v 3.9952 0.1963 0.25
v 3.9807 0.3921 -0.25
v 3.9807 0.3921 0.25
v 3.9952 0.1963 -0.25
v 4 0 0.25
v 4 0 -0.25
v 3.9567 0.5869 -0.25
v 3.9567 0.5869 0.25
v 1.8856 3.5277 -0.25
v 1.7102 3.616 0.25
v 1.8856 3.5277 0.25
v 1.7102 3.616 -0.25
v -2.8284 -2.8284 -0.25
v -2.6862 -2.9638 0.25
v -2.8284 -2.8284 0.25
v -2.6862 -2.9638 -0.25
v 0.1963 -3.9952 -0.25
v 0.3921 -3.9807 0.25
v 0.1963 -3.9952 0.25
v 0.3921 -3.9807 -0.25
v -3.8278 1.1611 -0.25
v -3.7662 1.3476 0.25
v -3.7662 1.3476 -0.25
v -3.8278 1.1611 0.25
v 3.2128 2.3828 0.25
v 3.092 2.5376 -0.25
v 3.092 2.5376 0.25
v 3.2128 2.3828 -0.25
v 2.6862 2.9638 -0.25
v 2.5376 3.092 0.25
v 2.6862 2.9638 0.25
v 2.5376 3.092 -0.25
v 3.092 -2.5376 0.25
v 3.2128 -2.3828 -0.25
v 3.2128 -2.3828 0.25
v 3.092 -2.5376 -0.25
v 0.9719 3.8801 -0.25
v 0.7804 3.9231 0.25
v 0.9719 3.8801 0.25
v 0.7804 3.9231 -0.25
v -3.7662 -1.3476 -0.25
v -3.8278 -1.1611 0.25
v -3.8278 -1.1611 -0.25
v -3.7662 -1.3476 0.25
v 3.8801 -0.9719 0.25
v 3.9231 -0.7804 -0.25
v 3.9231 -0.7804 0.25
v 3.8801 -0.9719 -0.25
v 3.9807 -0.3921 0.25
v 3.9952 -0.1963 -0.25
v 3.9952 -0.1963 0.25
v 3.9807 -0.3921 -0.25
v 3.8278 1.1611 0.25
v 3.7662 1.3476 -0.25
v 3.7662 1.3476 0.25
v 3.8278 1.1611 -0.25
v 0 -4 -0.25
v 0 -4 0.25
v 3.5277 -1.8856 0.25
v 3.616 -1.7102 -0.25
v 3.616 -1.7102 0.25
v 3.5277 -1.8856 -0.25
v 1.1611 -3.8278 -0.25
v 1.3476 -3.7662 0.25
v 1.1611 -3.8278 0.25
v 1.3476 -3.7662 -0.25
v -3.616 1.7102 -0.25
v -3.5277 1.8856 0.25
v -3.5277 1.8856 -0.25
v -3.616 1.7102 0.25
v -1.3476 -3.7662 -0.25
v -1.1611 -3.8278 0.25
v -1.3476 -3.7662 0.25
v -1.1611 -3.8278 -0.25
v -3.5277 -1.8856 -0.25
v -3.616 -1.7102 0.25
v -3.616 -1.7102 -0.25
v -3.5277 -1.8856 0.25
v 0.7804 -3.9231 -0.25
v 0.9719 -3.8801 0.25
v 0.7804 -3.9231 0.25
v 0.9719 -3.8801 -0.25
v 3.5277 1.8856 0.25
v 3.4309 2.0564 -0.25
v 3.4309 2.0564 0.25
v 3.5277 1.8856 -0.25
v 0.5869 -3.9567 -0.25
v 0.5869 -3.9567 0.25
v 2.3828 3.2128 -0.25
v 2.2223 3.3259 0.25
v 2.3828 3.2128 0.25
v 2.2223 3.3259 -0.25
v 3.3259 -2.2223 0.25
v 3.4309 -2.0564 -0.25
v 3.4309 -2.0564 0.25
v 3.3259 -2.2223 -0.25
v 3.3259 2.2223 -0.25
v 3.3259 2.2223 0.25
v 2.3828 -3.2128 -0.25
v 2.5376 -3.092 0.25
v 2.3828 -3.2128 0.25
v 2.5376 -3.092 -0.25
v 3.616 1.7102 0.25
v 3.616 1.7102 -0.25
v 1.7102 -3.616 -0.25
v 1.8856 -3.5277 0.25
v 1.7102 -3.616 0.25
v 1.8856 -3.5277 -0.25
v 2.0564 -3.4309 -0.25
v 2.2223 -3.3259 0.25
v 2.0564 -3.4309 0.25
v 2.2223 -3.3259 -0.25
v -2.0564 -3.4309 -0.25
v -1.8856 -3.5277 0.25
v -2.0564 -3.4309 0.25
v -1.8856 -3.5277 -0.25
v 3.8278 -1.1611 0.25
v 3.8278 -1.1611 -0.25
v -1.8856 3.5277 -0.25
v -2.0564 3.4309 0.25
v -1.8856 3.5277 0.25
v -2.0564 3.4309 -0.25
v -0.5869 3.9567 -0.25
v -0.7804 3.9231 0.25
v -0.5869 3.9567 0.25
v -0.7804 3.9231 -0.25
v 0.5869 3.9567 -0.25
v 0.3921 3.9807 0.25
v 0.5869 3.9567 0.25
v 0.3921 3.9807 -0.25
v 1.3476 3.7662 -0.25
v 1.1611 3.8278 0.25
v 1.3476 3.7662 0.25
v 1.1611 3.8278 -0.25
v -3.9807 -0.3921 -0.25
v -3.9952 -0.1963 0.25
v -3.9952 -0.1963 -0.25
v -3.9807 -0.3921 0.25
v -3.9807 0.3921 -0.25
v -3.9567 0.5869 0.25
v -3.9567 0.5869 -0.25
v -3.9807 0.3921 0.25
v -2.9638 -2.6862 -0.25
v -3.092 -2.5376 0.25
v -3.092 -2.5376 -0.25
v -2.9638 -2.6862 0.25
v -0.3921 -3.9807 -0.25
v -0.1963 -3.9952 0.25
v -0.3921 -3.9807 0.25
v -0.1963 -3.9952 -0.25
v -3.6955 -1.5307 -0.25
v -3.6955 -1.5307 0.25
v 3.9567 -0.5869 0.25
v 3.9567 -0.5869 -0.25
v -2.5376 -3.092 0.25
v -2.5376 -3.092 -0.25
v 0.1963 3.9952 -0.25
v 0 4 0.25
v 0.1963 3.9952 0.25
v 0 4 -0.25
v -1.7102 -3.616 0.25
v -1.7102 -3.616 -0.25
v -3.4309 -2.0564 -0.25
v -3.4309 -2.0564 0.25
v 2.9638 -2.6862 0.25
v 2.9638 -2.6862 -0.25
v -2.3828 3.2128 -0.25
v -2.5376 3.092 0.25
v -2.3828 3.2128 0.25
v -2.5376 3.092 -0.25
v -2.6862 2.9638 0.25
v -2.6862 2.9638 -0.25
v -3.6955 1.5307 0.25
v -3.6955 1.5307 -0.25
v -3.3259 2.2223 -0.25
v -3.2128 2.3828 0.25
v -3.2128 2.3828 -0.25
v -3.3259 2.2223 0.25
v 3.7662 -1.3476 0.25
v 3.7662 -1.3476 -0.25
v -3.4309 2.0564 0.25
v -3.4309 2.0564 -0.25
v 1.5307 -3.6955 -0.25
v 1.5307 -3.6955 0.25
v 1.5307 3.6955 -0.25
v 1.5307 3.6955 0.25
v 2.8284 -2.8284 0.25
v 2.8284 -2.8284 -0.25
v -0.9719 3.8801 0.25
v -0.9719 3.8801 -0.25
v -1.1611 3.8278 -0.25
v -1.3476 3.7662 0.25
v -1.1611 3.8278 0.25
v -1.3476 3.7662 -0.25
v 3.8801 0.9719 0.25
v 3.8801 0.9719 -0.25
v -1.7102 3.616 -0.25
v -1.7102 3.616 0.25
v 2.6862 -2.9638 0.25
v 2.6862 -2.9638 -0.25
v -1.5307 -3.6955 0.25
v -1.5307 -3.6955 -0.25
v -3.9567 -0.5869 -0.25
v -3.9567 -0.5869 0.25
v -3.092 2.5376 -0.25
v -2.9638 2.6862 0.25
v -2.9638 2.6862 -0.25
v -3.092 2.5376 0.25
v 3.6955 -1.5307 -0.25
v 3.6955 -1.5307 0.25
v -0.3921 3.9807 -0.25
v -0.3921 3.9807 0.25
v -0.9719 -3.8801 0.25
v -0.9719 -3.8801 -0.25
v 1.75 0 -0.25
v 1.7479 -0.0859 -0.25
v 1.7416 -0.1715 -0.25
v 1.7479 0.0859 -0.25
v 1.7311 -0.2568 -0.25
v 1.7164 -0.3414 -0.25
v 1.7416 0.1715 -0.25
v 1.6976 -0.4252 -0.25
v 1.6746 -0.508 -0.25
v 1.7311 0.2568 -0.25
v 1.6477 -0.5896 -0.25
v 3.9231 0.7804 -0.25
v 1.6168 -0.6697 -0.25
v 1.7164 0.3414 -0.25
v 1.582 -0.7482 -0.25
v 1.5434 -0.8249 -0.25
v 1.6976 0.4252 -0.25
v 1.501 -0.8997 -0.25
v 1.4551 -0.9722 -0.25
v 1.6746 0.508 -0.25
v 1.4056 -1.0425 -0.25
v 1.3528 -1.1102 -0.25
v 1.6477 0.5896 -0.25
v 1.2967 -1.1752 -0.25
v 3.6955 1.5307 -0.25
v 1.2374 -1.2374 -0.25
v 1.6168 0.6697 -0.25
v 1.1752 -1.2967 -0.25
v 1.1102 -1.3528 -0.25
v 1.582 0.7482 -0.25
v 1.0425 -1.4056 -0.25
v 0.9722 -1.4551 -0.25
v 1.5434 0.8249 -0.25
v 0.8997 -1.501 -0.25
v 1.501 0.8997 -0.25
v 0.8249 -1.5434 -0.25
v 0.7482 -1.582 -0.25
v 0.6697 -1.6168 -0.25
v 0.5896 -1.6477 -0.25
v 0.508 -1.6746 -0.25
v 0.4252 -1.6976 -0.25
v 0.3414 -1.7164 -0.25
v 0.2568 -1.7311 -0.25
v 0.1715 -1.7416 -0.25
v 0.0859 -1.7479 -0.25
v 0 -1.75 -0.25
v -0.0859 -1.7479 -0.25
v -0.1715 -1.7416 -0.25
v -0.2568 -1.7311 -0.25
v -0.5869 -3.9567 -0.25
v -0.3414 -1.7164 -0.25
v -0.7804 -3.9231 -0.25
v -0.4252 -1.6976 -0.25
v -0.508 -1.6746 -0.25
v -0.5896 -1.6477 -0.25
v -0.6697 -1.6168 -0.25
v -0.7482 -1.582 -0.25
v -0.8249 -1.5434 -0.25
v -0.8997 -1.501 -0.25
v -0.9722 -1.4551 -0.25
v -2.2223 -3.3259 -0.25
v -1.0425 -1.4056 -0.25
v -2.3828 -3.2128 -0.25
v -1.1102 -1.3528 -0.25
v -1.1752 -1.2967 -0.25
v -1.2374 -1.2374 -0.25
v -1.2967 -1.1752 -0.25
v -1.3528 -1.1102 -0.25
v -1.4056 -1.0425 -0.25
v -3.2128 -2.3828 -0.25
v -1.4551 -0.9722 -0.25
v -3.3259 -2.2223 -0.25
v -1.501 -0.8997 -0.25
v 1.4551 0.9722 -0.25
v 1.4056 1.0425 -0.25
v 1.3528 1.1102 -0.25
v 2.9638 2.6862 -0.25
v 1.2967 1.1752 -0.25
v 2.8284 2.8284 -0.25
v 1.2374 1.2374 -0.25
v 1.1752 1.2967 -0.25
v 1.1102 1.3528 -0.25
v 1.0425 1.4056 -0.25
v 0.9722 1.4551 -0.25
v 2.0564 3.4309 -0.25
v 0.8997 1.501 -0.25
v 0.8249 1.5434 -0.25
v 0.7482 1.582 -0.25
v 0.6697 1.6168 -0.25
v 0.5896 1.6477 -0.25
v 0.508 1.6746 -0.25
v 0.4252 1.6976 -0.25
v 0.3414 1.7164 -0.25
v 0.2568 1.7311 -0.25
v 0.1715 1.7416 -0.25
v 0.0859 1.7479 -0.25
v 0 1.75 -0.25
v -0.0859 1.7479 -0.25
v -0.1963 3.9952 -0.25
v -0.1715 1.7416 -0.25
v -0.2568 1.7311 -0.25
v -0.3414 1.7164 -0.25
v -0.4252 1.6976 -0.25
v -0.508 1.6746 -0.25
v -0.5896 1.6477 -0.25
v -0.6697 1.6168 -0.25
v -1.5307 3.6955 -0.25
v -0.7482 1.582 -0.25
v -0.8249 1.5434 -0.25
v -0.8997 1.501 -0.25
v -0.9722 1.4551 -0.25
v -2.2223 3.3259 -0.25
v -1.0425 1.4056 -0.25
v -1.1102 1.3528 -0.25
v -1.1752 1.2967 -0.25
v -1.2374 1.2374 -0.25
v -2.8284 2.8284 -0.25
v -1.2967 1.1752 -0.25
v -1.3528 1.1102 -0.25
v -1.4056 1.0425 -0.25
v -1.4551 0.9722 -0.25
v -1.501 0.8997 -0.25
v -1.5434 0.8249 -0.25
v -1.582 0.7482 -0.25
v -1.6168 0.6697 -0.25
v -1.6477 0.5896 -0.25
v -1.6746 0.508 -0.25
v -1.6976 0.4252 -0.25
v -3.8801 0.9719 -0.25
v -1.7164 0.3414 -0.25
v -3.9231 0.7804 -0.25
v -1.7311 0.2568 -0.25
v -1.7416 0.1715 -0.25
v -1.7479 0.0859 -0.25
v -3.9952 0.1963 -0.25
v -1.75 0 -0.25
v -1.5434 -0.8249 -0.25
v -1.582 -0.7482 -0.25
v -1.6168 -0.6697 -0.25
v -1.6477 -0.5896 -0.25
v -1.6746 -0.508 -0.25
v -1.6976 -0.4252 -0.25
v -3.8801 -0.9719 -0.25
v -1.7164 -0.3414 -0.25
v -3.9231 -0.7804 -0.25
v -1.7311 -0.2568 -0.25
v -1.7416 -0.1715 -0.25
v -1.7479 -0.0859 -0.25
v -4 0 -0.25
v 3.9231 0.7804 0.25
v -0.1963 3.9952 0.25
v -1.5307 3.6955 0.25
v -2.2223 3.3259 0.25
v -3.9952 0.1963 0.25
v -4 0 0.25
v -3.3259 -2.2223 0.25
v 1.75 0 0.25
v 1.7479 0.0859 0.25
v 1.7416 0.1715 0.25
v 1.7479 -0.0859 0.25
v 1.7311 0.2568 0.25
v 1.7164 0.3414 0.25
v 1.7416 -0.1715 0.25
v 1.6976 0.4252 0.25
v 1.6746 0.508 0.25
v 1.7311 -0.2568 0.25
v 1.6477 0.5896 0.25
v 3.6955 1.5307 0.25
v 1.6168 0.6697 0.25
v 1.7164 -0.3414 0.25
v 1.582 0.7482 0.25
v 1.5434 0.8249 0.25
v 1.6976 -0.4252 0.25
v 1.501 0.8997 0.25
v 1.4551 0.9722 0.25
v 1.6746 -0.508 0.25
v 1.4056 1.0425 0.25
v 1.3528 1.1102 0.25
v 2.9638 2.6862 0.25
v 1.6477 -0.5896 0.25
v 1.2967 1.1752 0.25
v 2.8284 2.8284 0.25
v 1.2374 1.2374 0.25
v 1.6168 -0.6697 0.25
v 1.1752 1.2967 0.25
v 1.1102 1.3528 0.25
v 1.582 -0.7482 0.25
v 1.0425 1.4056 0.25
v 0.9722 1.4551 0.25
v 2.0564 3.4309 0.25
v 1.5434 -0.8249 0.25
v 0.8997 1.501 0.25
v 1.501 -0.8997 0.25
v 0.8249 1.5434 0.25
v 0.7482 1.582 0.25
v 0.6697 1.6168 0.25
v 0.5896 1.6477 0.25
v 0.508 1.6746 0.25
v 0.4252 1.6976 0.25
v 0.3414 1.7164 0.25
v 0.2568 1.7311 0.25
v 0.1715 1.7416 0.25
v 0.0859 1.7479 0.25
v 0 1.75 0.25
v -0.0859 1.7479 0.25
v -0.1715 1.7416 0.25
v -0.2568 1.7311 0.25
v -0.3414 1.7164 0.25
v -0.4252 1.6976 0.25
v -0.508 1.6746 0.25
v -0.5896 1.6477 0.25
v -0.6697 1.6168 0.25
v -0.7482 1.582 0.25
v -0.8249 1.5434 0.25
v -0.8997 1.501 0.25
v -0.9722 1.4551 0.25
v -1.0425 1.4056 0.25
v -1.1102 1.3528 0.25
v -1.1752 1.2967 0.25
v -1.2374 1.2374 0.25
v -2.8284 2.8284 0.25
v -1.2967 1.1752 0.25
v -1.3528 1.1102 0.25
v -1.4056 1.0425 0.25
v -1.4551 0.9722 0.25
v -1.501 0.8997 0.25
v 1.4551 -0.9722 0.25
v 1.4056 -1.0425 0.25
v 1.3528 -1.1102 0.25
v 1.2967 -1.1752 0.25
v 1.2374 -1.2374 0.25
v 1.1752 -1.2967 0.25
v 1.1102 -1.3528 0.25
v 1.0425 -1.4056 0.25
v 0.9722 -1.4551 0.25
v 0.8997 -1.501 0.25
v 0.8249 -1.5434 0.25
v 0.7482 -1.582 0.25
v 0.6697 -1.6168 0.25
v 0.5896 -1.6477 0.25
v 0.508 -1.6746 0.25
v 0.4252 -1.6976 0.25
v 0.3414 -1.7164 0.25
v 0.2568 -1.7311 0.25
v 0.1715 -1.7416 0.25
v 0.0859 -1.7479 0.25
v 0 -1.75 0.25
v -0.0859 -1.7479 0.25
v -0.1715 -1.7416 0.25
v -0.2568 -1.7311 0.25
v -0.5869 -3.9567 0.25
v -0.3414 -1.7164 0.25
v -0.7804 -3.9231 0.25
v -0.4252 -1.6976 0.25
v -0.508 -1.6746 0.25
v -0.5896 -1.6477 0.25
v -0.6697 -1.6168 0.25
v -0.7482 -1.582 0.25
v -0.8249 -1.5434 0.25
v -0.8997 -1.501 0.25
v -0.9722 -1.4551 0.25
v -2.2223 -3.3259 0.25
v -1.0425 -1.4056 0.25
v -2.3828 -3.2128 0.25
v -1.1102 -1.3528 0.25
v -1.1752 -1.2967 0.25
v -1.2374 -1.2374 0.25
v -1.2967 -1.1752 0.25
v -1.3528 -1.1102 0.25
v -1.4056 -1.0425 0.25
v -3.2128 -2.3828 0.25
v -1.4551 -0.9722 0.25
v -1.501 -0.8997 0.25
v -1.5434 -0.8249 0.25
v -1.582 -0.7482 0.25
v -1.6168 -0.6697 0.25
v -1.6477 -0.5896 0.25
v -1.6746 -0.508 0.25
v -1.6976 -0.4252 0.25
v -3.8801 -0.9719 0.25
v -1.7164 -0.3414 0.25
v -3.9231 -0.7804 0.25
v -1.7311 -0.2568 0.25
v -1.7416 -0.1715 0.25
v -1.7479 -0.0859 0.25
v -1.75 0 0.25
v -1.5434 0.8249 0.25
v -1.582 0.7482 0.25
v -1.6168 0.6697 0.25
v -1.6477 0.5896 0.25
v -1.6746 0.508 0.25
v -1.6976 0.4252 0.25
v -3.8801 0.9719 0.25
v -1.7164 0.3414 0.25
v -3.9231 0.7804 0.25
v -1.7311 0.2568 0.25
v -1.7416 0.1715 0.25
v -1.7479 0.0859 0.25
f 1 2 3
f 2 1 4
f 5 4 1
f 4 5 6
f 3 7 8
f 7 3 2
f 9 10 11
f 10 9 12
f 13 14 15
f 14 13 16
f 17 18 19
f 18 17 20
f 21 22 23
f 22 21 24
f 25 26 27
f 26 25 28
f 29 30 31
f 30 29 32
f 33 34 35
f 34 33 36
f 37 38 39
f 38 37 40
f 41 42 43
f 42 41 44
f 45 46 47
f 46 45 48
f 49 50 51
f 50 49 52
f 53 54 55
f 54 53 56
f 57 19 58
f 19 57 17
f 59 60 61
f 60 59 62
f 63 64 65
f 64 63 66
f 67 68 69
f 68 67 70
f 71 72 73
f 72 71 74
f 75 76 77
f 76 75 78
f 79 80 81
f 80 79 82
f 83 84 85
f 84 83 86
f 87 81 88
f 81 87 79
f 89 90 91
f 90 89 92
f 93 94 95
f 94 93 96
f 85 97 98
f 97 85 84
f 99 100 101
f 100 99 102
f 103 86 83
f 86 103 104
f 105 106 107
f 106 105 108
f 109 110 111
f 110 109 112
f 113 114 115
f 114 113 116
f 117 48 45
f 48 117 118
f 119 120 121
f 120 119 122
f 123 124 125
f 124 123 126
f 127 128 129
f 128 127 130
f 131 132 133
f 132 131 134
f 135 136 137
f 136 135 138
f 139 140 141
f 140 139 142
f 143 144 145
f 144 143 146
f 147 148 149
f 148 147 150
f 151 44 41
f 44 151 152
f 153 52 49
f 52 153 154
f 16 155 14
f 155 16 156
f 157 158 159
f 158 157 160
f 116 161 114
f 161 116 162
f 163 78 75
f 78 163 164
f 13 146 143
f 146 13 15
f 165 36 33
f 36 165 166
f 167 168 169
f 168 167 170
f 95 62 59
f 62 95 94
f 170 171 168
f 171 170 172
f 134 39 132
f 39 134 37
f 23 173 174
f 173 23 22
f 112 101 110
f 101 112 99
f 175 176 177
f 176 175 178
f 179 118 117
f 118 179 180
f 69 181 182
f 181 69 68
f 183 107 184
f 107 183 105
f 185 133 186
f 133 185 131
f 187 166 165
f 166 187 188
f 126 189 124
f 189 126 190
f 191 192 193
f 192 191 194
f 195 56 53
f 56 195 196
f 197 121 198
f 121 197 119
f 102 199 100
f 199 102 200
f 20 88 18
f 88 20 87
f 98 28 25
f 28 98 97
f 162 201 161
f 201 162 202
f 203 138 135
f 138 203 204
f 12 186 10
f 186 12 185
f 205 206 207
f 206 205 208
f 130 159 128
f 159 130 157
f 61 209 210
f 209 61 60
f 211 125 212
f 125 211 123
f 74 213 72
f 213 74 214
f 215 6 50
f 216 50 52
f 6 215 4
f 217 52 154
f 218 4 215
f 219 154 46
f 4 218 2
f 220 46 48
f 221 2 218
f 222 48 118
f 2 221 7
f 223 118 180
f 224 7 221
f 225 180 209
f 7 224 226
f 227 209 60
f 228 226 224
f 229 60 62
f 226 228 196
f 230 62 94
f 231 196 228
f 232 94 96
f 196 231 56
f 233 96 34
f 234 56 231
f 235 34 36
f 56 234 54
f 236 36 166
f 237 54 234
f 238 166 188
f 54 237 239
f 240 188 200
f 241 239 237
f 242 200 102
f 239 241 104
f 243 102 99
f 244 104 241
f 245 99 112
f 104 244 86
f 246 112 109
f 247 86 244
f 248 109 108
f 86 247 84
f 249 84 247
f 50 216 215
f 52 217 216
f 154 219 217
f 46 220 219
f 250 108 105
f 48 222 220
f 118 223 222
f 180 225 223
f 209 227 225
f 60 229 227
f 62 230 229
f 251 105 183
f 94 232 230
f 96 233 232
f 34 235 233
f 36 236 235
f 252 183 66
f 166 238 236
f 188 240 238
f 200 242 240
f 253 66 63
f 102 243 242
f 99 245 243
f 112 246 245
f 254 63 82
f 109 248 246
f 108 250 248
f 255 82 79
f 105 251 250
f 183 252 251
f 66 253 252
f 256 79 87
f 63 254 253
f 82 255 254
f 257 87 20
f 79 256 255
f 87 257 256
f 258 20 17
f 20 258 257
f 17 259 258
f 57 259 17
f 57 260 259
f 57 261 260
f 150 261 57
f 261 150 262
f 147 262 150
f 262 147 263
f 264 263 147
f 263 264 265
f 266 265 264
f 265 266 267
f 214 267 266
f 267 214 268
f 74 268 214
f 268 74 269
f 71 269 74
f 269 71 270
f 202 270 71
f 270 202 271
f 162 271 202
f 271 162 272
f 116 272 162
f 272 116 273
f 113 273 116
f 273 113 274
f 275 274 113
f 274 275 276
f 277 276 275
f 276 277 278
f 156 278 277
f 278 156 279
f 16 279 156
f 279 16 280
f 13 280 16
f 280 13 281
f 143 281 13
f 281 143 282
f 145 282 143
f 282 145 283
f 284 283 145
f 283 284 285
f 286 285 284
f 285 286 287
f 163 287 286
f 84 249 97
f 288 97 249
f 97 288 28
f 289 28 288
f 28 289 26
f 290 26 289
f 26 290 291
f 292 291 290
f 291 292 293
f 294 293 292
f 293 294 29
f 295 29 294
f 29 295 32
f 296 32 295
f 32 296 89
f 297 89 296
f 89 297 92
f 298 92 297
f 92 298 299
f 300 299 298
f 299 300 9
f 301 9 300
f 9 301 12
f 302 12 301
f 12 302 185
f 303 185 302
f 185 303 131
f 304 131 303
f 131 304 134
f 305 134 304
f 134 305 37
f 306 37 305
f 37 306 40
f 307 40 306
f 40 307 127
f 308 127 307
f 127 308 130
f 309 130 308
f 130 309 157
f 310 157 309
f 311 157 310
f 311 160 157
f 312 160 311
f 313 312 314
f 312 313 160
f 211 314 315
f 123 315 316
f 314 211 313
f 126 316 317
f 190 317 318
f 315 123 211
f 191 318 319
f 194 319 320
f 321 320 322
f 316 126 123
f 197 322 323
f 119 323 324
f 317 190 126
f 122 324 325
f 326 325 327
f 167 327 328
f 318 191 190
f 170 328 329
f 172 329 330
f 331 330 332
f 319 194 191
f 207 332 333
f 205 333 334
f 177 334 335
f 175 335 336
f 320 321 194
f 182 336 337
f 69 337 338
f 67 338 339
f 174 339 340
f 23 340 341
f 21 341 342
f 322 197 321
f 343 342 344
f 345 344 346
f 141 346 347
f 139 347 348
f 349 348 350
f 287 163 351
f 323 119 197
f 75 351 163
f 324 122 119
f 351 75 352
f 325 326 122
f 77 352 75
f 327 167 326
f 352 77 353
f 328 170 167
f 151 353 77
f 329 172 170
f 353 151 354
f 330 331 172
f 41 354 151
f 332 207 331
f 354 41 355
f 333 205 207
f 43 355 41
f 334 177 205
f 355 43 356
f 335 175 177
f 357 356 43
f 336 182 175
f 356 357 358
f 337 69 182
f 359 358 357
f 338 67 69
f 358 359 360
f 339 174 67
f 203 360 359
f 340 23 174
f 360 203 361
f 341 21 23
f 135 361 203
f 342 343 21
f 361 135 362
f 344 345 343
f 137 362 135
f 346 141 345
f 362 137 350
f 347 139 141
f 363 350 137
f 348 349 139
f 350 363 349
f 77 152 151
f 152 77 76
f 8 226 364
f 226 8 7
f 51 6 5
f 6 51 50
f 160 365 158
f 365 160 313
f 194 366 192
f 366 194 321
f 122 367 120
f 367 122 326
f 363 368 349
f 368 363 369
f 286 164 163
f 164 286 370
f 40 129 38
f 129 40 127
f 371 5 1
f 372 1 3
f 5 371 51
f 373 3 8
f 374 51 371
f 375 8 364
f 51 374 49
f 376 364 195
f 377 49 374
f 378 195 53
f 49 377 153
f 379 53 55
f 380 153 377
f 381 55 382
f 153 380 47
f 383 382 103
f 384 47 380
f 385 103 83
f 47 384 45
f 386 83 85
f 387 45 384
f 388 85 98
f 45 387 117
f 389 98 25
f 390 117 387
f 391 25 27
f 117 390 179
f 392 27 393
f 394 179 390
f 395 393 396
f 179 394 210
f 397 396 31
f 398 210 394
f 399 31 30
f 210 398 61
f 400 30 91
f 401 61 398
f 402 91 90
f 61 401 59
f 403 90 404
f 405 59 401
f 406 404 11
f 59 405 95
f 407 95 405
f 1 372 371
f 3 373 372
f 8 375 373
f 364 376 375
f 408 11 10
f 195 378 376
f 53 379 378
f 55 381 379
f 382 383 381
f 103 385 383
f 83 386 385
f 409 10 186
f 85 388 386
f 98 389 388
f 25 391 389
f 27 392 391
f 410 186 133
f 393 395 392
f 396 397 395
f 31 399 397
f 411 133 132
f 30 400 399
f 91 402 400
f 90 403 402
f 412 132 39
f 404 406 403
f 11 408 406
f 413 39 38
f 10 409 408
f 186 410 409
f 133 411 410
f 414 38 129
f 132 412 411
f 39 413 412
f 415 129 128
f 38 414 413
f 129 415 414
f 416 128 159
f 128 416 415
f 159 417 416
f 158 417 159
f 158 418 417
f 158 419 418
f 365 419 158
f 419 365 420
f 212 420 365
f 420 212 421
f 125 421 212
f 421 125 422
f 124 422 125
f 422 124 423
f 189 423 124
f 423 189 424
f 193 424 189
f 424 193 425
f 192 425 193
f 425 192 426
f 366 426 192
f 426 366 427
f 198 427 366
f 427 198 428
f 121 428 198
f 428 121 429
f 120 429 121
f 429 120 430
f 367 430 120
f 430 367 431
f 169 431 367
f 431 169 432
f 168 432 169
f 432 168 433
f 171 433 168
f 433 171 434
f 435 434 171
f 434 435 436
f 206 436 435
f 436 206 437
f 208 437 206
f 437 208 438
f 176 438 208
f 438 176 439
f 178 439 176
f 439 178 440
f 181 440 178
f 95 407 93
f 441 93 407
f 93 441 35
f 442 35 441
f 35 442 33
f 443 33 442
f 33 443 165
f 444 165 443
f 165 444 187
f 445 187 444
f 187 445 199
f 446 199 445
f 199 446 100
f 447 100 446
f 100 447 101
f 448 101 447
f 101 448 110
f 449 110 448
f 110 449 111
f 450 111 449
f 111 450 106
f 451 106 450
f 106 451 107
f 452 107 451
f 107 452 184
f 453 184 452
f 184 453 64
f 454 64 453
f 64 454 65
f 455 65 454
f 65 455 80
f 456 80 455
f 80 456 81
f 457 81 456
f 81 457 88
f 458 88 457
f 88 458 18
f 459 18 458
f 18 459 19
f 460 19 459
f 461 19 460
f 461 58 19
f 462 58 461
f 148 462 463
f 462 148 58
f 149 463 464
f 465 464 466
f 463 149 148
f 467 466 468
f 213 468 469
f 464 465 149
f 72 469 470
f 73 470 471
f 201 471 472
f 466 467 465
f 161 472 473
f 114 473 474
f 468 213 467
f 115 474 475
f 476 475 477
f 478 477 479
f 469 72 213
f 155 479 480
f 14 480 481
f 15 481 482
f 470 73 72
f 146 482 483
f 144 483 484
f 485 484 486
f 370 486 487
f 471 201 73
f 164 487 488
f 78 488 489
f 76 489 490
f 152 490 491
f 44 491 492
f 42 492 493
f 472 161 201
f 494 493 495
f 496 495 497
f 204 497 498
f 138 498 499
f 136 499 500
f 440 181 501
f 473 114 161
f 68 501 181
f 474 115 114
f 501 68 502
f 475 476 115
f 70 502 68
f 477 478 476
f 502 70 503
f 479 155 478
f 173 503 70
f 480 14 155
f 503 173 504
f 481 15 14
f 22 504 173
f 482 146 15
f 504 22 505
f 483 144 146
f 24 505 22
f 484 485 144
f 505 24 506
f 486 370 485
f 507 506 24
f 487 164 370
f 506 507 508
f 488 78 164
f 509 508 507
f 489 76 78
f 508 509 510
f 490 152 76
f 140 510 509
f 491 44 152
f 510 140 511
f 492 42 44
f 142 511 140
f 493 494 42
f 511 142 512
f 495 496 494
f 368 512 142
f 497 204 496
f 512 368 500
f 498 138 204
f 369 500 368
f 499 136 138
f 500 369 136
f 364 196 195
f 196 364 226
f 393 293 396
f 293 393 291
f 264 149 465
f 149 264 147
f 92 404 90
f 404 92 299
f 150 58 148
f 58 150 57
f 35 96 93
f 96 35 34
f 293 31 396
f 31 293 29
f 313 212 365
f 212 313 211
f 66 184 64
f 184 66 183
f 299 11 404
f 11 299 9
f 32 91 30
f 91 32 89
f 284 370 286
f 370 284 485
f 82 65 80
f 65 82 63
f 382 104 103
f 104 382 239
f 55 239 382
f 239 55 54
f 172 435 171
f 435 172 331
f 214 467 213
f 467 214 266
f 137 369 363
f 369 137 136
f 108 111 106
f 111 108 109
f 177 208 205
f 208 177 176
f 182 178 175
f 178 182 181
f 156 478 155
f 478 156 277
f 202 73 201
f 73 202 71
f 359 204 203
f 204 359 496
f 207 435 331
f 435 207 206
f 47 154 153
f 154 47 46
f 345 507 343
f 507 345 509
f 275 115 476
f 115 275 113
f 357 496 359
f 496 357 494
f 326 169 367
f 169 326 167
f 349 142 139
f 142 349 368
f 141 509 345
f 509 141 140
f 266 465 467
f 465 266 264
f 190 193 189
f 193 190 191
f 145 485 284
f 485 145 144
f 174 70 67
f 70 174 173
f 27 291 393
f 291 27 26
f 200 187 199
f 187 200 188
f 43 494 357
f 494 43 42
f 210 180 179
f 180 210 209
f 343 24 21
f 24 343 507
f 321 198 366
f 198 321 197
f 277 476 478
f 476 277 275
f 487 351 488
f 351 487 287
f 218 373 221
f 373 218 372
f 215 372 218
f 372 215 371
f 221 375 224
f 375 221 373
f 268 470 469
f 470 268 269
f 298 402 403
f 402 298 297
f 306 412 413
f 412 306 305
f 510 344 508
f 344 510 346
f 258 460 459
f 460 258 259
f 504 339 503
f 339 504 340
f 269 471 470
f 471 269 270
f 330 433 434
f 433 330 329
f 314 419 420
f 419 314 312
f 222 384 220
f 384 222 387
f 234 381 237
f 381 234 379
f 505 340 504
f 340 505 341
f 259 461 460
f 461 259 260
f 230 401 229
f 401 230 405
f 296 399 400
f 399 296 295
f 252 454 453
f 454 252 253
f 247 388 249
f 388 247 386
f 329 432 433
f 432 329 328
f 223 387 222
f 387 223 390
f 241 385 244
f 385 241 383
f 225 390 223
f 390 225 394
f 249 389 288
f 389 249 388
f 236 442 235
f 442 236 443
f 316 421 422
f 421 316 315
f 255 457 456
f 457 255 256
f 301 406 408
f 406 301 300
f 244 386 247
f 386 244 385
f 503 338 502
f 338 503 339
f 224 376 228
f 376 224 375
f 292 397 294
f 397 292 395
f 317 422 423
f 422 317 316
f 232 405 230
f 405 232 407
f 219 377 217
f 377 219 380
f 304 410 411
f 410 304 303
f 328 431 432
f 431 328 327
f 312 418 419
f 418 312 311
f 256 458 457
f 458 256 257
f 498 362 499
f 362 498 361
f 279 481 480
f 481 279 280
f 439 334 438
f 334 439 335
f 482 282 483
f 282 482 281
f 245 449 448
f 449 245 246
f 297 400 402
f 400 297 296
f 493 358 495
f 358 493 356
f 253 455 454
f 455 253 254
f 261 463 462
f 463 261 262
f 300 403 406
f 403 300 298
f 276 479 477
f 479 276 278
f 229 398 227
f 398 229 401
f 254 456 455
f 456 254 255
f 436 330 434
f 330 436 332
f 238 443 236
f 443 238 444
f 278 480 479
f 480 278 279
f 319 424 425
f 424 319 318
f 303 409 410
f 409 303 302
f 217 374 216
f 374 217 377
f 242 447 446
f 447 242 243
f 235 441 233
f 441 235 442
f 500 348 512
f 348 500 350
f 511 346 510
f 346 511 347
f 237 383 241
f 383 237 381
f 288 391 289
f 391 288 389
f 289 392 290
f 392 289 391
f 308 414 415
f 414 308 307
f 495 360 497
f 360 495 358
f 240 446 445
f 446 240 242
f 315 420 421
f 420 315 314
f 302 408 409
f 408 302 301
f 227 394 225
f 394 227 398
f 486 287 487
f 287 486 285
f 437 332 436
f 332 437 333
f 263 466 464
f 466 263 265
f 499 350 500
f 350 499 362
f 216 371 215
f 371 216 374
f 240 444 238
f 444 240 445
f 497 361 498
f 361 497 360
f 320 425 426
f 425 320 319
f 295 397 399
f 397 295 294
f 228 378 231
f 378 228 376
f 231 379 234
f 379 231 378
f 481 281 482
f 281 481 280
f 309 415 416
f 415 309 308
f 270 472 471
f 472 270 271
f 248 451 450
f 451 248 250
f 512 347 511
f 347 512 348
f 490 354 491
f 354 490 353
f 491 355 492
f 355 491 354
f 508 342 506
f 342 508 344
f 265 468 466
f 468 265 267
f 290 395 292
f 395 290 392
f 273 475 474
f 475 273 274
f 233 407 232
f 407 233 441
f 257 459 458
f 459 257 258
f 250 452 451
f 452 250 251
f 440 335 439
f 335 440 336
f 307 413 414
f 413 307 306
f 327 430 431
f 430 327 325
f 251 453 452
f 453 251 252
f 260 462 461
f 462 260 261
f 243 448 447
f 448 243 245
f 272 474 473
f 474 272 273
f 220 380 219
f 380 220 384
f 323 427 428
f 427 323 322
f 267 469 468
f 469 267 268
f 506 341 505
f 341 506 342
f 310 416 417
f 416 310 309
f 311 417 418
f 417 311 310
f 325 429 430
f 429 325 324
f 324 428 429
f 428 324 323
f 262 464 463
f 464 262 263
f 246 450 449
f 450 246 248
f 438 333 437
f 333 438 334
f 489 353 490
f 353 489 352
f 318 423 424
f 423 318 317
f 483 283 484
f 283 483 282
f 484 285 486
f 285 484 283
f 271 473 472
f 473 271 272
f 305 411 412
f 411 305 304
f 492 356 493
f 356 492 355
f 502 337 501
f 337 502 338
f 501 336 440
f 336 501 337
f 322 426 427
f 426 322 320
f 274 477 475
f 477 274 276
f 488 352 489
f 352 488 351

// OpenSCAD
$fn = 128;

inner_d   = 3.5;
outer_d   = 8.0;
thickness = 0.5;

difference() {
    cylinder(h = thickness, d = outer_d, center = true);
    cylinder(h = thickness + 0.2, d = inner_d, center = true);
}
